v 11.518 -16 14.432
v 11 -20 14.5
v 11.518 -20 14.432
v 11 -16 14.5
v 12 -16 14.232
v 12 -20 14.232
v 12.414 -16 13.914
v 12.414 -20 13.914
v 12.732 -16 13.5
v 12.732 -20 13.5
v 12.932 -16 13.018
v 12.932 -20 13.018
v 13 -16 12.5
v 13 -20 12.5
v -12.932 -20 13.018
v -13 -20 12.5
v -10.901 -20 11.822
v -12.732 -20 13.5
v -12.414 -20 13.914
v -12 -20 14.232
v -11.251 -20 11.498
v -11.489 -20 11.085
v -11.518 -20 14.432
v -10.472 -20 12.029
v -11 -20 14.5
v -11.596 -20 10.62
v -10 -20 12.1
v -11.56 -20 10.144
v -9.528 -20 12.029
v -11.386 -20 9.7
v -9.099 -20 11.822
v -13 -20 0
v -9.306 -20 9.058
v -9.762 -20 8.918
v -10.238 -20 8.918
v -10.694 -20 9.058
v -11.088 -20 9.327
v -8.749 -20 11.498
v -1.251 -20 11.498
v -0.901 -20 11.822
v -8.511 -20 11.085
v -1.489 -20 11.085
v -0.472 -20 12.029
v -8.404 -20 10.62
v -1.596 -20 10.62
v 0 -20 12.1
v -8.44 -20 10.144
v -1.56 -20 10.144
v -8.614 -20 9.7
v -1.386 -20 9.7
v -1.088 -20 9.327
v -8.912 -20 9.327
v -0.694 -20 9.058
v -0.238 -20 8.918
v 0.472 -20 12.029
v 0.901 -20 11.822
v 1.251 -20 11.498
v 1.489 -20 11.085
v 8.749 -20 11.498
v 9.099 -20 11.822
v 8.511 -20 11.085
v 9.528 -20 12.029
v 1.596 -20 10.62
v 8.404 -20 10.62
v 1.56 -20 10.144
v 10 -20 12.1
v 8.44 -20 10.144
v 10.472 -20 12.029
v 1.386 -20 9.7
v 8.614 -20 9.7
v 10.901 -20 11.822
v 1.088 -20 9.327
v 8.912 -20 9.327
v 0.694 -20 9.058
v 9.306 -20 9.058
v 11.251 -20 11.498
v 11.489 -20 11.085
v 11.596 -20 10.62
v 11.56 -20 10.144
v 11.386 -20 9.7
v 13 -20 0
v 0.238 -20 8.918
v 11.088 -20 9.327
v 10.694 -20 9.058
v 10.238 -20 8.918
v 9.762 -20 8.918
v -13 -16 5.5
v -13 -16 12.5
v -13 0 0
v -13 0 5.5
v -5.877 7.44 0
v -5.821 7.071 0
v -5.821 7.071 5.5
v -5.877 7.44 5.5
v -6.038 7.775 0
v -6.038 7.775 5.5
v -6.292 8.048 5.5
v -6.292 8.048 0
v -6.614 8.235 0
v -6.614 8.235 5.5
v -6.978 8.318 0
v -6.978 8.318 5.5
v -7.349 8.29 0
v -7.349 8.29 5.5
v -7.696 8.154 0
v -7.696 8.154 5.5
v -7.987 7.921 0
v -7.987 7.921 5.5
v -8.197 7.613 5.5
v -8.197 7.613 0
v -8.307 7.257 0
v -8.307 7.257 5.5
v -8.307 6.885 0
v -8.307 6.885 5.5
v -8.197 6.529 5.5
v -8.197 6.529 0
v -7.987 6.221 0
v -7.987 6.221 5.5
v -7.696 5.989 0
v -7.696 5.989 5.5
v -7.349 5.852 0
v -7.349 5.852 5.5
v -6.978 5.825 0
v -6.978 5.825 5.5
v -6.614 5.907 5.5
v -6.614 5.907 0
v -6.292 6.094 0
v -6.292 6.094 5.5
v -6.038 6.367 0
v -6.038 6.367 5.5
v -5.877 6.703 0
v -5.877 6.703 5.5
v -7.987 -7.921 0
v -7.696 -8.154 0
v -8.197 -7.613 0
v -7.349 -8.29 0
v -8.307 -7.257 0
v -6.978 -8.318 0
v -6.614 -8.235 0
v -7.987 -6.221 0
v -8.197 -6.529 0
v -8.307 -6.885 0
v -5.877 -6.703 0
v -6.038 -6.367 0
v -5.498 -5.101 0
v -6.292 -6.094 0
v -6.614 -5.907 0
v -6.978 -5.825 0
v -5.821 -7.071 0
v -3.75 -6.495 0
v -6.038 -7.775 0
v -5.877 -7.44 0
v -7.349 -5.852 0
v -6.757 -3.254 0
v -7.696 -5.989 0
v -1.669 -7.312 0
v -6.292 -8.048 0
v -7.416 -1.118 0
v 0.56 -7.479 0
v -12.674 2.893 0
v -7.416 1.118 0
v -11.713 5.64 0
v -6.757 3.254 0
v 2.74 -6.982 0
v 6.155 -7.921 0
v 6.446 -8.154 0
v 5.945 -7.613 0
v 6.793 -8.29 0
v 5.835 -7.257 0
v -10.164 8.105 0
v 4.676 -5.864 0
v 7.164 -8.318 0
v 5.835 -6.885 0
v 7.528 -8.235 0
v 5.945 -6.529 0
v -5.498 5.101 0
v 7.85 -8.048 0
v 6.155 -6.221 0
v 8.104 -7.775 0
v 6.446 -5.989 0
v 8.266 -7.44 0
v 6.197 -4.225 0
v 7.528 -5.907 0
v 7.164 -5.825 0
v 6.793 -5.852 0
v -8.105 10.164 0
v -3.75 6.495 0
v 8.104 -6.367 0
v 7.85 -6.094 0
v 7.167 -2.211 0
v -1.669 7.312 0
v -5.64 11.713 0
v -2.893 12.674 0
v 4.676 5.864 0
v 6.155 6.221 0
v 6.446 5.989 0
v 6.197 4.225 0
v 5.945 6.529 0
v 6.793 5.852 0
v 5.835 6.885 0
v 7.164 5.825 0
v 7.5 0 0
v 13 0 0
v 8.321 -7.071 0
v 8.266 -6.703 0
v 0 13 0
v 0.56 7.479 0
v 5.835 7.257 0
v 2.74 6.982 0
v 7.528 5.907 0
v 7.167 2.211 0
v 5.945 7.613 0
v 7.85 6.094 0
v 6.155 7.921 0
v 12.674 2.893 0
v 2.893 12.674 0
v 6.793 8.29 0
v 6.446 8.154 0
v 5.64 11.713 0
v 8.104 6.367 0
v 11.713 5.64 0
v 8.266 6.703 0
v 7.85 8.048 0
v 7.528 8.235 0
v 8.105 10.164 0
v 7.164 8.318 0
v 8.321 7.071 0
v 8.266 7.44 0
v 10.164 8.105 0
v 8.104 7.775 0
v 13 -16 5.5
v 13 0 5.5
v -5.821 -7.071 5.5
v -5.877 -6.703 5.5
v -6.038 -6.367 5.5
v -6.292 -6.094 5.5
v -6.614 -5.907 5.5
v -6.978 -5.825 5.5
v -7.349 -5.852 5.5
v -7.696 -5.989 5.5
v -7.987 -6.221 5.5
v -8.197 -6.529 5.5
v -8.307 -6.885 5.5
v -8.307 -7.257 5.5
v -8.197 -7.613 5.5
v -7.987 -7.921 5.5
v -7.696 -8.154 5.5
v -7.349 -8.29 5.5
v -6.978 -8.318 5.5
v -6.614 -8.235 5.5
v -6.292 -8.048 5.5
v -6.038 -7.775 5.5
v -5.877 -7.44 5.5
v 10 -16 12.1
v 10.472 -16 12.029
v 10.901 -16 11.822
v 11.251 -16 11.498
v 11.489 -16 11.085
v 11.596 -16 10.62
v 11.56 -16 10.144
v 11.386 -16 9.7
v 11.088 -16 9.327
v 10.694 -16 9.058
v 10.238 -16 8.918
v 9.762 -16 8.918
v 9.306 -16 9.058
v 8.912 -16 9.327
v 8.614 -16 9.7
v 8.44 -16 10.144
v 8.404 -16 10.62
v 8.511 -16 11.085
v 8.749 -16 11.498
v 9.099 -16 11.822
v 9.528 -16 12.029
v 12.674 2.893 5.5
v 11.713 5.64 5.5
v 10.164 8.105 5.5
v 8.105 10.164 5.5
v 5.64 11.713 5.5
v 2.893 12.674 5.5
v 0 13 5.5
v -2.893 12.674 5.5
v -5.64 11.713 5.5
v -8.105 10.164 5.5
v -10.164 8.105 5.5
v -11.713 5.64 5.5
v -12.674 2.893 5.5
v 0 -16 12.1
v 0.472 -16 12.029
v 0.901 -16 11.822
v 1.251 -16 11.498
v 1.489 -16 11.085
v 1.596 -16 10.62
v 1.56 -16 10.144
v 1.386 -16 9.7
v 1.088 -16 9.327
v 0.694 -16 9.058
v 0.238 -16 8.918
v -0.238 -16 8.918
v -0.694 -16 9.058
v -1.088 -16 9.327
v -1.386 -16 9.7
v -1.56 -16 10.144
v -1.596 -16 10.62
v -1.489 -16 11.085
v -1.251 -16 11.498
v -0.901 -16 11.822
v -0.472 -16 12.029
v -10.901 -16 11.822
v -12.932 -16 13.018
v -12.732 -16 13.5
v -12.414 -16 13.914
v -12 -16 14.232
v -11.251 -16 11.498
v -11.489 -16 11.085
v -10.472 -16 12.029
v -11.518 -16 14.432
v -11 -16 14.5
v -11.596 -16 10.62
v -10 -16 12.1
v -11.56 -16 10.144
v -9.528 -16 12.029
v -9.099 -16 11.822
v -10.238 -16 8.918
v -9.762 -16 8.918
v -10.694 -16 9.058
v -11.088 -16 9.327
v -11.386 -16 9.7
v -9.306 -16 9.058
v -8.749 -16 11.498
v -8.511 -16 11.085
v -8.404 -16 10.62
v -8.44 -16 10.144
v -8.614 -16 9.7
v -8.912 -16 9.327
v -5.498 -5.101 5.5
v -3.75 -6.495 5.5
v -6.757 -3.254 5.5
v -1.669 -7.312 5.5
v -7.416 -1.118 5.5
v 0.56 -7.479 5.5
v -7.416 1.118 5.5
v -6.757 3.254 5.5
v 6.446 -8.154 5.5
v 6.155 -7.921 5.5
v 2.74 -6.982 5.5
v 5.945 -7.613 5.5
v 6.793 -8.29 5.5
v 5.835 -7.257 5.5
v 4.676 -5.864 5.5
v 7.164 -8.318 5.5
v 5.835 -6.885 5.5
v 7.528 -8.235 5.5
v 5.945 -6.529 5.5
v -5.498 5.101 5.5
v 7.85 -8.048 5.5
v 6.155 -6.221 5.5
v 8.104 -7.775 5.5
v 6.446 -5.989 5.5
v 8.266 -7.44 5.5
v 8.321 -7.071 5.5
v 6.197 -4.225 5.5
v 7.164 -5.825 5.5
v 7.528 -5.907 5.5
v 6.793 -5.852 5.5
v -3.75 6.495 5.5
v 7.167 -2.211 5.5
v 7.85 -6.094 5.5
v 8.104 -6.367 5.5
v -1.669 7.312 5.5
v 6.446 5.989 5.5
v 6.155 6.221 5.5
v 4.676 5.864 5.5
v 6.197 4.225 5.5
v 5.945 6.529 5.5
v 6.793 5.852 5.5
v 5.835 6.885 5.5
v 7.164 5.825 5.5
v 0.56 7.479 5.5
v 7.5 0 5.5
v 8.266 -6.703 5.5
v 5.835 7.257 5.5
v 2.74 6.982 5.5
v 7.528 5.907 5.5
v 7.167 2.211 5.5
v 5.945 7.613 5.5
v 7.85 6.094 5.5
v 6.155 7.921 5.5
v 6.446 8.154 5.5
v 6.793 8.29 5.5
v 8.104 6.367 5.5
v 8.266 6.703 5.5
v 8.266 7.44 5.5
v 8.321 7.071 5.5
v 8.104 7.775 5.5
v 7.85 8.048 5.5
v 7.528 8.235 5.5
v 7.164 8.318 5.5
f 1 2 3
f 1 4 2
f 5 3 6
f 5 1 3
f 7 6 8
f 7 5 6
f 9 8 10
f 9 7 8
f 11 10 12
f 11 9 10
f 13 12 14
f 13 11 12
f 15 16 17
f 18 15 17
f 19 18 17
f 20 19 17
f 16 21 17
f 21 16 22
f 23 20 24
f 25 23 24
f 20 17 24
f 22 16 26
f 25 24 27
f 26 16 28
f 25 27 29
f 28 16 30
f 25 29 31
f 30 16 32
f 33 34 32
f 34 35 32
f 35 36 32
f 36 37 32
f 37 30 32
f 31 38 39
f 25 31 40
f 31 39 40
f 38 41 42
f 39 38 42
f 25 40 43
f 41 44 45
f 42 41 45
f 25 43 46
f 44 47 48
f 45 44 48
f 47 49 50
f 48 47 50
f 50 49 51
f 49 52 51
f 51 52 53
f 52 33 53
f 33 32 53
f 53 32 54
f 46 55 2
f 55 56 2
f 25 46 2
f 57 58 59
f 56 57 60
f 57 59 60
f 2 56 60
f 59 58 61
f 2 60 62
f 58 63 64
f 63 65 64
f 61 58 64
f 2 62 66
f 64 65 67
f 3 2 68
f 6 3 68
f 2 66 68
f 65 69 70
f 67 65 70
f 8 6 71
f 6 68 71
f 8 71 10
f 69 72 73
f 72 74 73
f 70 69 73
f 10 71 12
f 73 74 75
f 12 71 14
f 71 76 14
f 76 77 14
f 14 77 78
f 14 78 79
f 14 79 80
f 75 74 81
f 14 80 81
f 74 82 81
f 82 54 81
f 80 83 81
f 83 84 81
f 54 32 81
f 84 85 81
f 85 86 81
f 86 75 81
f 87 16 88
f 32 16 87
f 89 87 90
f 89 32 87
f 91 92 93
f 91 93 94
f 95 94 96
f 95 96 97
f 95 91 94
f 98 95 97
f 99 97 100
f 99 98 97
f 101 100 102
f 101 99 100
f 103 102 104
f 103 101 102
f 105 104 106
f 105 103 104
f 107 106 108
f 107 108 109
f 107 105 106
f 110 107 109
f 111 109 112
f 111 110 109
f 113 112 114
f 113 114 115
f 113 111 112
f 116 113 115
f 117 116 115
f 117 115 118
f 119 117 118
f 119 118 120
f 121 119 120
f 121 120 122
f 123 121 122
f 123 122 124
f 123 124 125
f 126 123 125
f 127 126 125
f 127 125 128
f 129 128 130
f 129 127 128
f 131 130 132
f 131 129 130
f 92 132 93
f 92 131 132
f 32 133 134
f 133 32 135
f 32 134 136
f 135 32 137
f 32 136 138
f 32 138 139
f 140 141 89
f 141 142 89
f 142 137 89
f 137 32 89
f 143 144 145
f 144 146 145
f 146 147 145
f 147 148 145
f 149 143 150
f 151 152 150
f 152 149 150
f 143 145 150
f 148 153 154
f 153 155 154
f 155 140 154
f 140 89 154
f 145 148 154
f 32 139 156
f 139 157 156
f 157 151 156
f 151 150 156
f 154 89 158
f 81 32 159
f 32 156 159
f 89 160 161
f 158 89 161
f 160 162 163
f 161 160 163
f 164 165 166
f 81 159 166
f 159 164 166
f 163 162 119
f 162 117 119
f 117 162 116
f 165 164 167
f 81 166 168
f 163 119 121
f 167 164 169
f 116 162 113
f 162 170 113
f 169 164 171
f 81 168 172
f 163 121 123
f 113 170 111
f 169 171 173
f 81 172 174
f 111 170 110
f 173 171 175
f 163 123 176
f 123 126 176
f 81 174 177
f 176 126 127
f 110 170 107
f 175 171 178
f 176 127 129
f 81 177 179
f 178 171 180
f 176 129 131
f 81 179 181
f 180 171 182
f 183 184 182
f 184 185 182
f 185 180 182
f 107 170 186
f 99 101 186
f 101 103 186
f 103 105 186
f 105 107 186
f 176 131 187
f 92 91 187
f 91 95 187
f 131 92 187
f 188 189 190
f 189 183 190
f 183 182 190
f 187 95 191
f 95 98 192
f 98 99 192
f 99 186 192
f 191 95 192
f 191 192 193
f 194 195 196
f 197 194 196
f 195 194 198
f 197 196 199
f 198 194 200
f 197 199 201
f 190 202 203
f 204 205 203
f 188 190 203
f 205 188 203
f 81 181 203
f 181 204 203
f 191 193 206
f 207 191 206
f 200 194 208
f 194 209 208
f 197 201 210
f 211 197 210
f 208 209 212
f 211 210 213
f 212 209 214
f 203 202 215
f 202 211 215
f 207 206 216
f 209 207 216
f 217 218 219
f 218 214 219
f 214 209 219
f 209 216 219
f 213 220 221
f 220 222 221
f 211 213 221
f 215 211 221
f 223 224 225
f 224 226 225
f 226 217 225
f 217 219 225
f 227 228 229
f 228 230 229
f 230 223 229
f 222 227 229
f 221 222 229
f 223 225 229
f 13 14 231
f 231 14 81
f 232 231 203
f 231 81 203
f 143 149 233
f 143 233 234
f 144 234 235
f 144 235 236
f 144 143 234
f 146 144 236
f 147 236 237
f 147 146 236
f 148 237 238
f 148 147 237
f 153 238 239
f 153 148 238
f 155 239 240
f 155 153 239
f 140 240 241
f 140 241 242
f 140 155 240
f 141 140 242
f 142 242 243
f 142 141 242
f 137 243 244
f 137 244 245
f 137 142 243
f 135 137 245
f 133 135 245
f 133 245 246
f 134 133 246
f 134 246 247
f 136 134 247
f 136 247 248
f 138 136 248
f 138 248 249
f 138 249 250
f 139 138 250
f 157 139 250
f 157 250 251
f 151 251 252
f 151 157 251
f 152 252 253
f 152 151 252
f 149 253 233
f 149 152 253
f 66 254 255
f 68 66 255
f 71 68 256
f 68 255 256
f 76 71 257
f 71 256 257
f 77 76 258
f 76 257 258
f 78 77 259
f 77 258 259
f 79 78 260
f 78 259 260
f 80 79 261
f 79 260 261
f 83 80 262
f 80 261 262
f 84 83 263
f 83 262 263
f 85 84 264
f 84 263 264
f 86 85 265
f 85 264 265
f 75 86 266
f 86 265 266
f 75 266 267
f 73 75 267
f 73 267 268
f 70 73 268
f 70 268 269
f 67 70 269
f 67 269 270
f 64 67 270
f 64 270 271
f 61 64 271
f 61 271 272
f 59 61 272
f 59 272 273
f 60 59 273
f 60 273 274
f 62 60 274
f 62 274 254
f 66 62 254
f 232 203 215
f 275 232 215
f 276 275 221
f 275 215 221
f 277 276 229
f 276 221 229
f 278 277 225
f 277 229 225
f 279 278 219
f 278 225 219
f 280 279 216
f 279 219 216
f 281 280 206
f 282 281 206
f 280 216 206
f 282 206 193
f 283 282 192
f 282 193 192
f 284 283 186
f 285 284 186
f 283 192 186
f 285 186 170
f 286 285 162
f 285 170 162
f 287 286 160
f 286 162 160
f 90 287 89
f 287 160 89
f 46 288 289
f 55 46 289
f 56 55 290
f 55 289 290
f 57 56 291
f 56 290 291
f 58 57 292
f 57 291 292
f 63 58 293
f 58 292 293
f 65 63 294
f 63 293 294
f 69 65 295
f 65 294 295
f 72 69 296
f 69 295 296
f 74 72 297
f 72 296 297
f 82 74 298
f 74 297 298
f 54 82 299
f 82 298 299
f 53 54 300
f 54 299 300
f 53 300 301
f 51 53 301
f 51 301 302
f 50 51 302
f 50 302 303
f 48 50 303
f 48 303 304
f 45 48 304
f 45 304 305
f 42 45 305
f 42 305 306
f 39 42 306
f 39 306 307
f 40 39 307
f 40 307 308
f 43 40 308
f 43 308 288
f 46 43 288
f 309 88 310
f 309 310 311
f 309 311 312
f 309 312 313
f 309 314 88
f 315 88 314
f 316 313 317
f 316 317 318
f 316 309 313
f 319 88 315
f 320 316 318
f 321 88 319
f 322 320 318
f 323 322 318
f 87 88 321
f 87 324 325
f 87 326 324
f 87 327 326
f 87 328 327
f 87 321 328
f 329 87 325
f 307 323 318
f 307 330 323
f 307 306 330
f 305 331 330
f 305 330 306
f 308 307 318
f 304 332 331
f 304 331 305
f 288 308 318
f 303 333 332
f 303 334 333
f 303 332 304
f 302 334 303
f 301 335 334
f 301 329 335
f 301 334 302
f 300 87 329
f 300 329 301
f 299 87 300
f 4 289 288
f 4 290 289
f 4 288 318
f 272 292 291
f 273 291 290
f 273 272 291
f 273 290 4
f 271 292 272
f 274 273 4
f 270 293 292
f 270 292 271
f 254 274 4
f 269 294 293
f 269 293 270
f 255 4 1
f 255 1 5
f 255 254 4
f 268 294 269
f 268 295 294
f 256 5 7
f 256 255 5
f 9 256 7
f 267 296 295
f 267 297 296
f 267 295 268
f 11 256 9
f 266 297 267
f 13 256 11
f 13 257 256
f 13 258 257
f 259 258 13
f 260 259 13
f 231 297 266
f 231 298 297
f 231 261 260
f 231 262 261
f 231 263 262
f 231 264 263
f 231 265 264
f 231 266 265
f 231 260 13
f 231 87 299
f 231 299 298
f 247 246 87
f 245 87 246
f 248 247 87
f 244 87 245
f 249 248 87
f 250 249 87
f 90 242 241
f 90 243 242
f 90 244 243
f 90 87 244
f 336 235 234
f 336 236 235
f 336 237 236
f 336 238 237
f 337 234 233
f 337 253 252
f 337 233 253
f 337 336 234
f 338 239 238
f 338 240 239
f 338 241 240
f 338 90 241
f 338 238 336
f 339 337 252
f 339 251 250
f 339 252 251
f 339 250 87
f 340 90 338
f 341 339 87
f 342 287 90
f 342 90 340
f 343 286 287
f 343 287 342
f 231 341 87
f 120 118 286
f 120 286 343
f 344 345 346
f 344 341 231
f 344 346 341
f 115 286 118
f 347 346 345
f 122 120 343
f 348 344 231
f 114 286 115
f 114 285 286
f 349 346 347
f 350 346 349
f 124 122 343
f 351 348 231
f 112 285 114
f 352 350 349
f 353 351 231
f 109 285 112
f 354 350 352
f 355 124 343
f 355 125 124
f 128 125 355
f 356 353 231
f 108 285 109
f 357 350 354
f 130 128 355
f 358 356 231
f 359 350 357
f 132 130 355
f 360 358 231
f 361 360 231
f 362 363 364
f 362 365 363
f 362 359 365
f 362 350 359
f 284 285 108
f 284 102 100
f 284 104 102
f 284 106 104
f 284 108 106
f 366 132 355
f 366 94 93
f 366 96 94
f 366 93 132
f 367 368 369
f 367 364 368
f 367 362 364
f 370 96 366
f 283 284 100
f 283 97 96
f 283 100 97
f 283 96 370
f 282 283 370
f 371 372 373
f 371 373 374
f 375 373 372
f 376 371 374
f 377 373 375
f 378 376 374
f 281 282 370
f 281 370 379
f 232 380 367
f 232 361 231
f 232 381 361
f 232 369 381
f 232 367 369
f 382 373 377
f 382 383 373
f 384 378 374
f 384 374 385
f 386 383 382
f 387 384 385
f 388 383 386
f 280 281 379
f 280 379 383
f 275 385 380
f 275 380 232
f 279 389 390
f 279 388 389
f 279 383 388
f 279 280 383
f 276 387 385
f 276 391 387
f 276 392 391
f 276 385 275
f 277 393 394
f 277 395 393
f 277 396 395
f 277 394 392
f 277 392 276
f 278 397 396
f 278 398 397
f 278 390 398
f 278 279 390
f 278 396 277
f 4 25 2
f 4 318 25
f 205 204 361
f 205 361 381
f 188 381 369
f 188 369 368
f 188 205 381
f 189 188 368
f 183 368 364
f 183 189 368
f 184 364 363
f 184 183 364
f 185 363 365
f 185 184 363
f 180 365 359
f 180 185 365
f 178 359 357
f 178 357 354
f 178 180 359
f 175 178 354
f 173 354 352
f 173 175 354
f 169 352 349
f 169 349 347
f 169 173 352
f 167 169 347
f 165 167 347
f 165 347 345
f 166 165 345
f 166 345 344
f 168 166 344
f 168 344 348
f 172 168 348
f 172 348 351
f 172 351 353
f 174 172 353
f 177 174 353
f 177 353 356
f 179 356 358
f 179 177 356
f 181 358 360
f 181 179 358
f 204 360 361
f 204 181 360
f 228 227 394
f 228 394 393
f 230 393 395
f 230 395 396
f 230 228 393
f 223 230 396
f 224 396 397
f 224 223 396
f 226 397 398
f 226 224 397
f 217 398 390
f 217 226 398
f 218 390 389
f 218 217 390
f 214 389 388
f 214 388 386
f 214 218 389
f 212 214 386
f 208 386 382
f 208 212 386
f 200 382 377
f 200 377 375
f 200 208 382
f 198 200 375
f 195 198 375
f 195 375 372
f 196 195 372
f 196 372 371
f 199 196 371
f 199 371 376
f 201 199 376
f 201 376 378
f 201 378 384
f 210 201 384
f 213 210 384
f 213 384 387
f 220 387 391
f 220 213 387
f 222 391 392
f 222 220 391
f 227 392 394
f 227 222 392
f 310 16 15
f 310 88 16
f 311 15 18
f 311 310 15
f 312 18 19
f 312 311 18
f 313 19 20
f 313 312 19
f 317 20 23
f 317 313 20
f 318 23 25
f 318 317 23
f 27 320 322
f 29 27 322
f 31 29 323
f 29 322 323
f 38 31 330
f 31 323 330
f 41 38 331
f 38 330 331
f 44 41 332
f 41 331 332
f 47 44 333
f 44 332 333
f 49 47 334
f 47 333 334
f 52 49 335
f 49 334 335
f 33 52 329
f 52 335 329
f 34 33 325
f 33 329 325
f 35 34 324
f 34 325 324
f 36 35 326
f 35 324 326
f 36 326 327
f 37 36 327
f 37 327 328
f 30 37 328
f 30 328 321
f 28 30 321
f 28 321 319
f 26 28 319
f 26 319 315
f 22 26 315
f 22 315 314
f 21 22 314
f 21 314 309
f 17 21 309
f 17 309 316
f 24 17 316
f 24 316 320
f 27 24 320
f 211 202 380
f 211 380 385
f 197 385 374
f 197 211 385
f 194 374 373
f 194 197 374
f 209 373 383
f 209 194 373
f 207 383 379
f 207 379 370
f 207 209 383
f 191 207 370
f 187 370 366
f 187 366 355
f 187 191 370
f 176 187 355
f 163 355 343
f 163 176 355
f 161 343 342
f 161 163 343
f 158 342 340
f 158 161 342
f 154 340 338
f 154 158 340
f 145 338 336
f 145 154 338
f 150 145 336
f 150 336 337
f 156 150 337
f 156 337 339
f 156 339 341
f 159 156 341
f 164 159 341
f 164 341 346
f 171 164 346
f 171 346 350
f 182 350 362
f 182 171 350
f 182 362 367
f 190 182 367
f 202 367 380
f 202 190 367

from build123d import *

# Parameters (mm, degrees)
SKETCH_1_R          = 7.5
SKETCH_1_R_2        = 1.25
EXTRUDE_1_DEPTH     = 5.5
SKETCH_2_W          = 26
SKETCH_2_H          = 4
EXTRUDE_2_DEPTH     = 9
SKETCH_3_R          = 1.6
CUT_EXTRUDE_1_DEPTH = 12
FILLET_1_R          = 2


with BuildPart() as part:
    # 草图1 → 凸台-拉伸1 (new body)
    with BuildSketch(Plane.XY):
        with BuildLine():
            Line((-13, 0), (-13, -20))
            Line((-13, -20), (13, -20))
            Line((13, -20), (13, 0))
            ThreePointArc((13, 0), (0, 13), (-13, 0))
        make_face()
        Circle(SKETCH_1_R, mode=Mode.SUBTRACT)
        with Locations((-7.071067812, 7.071067812)):
            Circle(SKETCH_1_R_2, mode=Mode.SUBTRACT)
        with Locations((7.071067812, 7.071067812)):
            Circle(SKETCH_1_R_2, mode=Mode.SUBTRACT)
        with Locations((7.071067812, -7.071067812)):
            Circle(SKETCH_1_R_2, mode=Mode.SUBTRACT)
        with Locations((-7.071067812, -7.071067812)):
            Circle(SKETCH_1_R_2, mode=Mode.SUBTRACT)
    extrude(amount=EXTRUDE_1_DEPTH)

    # 草图2 → 凸台-拉伸2 (add)
    with BuildSketch(Plane.XY.offset(5.5)):
        with Locations((0, -18)):
            Rectangle(SKETCH_2_W, SKETCH_2_H)
    extrude(amount=EXTRUDE_2_DEPTH)

    # 草图3 → 切除-拉伸1 (cut)
    with BuildSketch(Plane(origin=(0, -16, 0), x_dir=(1, 0, 0), z_dir=(0, 1, 0))):
        with Locations(Location((-10, -10.5, 0), (0, 0, 270))):
            Circle(SKETCH_3_R)
        with Locations(Location((0, -10.5, 0), (0, 0, 270))):
            Circle(SKETCH_3_R)
        with Locations(Location((10, -10.5, 0), (0, 0, 270))):
            Circle(SKETCH_3_R)
    extrude(amount=-CUT_EXTRUDE_1_DEPTH, mode=Mode.SUBTRACT)

    # 圆角1
    fillet_1_edges = [part.edges().sort_by_distance(p)[0] for p in [
        (-13, -18, 14.5),
        (13, -18, 14.5),
    ]]
    fillet(fillet_1_edges, radius=FILLET_1_R)


solid = part.part
